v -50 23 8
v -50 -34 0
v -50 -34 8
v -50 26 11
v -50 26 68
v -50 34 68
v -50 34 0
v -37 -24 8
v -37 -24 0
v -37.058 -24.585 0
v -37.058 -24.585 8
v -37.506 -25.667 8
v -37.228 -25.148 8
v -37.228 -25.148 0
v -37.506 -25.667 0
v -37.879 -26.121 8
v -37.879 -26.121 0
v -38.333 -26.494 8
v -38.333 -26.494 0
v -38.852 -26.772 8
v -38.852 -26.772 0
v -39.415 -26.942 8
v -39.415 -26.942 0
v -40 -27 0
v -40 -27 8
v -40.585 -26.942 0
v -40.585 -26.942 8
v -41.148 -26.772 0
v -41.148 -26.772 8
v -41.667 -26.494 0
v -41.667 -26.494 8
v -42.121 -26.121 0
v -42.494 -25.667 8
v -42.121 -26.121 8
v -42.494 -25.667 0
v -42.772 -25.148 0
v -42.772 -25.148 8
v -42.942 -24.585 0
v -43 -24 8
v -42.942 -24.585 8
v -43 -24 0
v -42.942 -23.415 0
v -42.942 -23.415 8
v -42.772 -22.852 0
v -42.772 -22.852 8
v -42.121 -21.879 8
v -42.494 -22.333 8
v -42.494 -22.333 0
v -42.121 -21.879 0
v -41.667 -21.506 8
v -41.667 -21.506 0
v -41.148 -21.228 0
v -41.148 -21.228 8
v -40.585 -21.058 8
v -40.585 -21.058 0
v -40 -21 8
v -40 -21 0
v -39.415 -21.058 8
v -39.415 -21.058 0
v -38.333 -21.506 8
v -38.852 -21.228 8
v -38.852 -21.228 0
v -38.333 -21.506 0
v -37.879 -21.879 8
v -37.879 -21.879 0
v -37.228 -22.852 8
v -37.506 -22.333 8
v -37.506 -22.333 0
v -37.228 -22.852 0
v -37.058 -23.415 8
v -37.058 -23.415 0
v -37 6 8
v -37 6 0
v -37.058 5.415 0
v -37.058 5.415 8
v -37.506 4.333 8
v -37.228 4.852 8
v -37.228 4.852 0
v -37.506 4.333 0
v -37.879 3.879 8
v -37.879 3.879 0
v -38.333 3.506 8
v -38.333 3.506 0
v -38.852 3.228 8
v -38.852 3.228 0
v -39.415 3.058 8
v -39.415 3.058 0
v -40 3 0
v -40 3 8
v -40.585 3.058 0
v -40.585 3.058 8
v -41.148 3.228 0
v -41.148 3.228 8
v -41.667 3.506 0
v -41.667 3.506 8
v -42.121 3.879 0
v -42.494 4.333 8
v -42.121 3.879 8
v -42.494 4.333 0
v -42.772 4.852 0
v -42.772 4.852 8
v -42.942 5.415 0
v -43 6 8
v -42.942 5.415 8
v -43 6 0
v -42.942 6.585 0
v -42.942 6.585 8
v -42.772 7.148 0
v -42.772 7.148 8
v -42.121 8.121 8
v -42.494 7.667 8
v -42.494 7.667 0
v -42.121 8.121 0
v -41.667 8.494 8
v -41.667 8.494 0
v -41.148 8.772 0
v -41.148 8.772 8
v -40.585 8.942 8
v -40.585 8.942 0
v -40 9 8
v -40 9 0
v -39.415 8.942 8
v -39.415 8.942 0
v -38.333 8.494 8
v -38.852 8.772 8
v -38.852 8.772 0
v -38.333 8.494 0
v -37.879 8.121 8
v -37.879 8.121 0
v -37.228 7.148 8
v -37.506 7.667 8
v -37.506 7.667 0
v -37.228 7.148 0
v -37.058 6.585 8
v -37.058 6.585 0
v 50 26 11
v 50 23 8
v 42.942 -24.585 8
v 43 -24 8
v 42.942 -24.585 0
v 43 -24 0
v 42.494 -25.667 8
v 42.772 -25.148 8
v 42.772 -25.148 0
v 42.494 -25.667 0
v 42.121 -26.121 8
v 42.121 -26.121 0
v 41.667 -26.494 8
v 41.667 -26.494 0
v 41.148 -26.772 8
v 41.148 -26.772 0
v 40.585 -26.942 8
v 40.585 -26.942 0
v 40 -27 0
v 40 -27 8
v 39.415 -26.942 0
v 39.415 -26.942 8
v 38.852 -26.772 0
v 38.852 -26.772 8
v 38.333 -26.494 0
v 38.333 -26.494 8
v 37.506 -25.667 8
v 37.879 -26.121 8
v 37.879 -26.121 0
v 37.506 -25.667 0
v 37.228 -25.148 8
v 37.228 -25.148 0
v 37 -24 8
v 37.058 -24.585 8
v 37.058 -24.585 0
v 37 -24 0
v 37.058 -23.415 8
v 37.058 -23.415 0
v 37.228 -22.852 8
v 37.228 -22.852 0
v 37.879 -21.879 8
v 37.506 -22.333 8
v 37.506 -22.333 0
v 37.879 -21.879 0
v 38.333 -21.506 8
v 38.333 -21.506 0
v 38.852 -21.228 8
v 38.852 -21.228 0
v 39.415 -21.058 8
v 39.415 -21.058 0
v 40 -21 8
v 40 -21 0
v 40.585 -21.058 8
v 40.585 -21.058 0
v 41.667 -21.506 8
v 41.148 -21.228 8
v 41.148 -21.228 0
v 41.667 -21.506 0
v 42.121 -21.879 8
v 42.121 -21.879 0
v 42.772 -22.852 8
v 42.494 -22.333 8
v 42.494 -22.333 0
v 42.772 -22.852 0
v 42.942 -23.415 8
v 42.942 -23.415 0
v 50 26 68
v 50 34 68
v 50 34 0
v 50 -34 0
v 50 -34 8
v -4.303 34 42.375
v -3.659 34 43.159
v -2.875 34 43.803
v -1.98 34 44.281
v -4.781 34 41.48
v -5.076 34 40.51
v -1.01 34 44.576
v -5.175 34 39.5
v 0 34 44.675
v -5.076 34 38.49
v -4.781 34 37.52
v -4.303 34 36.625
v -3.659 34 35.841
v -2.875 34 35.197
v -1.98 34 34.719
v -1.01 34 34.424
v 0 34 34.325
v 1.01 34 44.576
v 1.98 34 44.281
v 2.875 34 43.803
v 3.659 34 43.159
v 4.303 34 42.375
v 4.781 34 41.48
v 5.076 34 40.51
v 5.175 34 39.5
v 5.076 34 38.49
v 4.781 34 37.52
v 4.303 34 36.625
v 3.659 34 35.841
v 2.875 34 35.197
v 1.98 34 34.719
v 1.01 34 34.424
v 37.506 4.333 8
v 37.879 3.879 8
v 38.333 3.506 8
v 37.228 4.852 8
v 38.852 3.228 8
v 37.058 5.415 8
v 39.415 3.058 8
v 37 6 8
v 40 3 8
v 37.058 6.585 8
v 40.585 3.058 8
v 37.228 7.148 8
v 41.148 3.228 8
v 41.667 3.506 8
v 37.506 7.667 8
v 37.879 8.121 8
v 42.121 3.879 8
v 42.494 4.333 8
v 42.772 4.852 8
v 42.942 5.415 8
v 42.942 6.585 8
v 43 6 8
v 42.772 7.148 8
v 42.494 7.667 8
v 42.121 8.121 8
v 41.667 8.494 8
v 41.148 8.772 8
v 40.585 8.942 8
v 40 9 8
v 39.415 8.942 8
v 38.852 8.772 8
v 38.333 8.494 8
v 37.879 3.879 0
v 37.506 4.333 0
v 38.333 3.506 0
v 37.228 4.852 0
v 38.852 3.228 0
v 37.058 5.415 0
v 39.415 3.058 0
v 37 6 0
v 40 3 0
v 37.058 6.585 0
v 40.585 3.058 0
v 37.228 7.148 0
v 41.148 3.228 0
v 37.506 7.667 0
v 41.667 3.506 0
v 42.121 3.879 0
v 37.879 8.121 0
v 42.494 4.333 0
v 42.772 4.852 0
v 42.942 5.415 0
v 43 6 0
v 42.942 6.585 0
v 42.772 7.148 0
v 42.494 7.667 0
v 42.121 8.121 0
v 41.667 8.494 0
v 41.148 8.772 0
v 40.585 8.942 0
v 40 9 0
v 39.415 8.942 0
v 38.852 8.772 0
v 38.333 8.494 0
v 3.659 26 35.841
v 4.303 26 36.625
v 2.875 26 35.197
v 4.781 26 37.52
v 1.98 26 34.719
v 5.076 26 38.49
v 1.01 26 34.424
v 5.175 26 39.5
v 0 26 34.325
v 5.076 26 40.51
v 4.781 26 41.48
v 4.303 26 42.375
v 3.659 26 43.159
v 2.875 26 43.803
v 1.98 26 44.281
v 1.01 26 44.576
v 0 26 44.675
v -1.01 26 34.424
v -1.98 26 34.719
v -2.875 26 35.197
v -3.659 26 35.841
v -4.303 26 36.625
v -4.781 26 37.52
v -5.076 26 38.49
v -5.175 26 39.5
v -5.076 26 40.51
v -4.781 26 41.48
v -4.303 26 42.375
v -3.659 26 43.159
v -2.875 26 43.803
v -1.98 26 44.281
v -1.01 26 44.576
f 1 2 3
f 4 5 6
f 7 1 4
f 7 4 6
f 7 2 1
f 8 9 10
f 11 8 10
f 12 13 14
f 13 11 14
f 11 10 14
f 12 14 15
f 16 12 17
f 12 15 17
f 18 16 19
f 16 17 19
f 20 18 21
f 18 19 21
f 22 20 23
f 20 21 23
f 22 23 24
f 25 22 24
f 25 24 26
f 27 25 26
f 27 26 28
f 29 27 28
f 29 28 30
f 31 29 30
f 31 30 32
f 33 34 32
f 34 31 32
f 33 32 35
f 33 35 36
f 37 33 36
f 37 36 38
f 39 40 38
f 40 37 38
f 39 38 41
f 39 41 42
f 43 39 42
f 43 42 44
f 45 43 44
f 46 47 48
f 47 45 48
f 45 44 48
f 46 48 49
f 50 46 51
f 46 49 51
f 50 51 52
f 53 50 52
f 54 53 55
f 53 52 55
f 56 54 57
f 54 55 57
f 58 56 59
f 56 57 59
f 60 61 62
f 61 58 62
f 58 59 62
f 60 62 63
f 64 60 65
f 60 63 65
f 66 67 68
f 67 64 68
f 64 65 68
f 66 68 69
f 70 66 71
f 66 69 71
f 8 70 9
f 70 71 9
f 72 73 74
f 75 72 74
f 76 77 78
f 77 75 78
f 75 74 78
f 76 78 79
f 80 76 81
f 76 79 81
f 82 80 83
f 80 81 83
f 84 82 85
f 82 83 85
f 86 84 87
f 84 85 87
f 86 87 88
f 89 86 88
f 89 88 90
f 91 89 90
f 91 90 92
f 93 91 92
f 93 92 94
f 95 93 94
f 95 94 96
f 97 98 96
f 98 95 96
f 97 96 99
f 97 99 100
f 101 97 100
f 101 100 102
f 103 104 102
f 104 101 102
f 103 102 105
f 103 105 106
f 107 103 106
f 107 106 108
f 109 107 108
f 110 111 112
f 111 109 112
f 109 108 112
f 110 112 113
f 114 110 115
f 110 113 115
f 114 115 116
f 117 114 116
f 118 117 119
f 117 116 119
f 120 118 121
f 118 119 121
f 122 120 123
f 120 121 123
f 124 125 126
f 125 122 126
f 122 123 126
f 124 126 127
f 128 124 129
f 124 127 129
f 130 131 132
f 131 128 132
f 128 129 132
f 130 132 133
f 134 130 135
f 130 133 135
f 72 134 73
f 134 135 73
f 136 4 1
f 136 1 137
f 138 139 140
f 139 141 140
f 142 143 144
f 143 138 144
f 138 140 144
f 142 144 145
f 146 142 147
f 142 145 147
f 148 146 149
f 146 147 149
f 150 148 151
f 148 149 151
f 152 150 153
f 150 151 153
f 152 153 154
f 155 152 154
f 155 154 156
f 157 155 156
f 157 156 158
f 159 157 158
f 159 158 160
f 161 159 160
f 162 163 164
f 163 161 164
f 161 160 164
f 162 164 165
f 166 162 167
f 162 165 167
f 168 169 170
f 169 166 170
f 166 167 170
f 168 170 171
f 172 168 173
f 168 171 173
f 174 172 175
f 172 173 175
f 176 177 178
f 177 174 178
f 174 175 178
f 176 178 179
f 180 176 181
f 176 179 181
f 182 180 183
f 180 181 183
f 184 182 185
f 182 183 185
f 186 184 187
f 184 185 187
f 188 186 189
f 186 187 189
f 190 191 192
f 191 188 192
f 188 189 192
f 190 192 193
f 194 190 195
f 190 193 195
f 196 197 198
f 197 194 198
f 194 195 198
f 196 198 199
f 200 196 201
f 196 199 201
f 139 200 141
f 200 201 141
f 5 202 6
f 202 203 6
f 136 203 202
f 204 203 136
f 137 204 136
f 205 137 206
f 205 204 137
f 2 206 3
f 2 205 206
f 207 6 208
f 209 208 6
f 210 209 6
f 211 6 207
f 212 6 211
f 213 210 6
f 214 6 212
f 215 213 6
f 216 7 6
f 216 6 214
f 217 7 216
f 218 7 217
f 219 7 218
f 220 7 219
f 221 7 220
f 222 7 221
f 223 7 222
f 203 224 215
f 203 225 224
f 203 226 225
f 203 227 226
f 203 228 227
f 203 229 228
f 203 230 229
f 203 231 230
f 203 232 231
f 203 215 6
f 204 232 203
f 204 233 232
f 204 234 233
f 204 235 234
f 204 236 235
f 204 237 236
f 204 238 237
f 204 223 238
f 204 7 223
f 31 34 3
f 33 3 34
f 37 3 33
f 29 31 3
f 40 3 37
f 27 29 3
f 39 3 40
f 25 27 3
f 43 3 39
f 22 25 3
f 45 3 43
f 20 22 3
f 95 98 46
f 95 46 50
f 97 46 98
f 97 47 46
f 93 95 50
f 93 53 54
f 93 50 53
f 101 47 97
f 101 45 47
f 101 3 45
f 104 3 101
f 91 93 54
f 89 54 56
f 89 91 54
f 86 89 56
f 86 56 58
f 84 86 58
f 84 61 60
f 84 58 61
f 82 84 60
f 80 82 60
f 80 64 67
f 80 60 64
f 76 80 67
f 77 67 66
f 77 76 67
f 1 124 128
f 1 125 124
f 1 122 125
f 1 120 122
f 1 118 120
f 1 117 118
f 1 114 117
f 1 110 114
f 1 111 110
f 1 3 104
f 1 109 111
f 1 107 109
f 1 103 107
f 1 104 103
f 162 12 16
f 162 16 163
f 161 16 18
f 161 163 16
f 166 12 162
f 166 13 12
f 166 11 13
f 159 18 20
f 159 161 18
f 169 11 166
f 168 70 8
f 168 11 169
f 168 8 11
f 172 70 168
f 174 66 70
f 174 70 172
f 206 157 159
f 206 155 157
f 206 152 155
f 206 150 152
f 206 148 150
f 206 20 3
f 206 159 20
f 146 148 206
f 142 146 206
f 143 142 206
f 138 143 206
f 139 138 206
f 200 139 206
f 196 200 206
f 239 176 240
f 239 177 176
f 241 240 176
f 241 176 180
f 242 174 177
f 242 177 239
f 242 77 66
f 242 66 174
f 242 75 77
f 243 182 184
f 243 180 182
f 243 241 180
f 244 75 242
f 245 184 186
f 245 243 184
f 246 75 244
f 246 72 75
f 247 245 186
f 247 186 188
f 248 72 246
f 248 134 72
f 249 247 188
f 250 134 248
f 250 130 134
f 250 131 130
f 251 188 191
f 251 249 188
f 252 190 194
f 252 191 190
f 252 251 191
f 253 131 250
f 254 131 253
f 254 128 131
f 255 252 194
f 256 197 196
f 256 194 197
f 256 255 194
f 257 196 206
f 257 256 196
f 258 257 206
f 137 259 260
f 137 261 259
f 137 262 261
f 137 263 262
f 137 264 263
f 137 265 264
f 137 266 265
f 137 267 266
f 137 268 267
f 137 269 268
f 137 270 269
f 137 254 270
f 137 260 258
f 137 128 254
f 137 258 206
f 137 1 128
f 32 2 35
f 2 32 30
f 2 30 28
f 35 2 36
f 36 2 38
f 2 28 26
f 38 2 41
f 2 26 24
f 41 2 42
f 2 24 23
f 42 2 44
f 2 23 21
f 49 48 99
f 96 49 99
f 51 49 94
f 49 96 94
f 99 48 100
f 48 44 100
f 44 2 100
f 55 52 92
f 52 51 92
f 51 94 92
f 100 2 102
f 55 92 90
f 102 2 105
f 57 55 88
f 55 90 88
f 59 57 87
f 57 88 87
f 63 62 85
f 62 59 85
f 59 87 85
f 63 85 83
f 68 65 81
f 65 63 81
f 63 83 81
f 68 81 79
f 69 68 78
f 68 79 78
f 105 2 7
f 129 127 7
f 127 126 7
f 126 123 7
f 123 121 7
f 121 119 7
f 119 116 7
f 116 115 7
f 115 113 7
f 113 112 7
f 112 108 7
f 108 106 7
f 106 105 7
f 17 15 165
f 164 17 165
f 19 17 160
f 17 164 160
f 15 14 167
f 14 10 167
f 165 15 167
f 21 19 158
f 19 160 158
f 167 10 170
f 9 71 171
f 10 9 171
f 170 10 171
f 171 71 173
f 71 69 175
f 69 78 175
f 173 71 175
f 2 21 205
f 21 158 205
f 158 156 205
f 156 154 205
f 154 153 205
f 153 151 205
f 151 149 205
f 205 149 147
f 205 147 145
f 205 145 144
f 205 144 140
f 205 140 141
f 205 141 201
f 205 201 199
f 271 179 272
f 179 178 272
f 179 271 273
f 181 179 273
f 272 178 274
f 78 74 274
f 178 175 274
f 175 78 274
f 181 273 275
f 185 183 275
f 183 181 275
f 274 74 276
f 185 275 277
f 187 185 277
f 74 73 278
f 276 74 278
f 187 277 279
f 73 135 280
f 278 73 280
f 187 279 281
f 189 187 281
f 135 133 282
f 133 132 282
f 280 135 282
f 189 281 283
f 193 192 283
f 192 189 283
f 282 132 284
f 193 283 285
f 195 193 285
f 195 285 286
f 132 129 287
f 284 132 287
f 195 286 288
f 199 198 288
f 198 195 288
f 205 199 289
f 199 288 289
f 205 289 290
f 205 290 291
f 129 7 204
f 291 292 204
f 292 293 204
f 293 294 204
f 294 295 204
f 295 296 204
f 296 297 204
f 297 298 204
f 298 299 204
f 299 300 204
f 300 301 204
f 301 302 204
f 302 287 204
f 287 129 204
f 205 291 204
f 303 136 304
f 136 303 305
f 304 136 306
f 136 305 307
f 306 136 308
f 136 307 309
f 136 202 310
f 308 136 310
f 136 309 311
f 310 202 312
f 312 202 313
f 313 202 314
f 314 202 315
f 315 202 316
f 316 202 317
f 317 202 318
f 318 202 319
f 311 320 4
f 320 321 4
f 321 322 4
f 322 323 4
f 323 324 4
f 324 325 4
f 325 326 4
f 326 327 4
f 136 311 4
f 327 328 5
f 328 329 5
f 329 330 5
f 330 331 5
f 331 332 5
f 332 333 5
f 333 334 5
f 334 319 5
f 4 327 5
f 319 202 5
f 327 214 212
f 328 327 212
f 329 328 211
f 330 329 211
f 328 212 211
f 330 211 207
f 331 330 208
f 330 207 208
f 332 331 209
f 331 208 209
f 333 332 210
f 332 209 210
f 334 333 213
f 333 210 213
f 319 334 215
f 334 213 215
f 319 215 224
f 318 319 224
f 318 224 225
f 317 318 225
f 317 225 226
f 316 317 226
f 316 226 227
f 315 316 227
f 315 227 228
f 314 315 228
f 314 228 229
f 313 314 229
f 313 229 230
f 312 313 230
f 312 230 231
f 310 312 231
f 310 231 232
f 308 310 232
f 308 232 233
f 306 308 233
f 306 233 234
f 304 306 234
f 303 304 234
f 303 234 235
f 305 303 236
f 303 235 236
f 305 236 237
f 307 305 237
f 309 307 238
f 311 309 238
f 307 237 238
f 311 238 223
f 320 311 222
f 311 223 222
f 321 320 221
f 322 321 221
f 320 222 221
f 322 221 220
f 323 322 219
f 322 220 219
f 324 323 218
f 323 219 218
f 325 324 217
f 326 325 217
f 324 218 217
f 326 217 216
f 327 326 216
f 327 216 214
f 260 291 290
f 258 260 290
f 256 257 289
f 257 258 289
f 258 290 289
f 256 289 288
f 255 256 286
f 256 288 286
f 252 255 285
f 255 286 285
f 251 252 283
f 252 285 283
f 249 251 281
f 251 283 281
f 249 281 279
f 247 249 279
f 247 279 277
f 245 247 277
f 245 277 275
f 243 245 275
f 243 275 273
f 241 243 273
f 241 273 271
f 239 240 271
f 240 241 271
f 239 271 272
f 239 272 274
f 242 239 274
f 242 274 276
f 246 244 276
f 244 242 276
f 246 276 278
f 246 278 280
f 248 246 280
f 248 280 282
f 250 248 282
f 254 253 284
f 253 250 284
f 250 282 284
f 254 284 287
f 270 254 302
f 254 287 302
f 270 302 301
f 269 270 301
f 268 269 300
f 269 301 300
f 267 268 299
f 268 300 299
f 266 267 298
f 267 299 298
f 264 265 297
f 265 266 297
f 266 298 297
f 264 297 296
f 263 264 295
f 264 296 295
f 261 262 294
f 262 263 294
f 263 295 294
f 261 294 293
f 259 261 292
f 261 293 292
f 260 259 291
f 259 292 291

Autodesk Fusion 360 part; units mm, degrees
sketch "Boceto1" plane through (0, 0, 0) normal (0, 0, 1) x (1, 0, 0)
  line L0 (50, -34) -> (-50, -34)
  line L1 (-50, -34) -> (-50, 34)
  line L2 (-50, 34) -> (50, 34)
  line L3 (50, 34) -> (50, -34)
  line L4 (50, -34) -> (-50, 34) construction
  line L5 (-50, -34) -> (50, 34) construction
  circle A0 centre (-40, 6) radius 3
  circle A1 centre (-40, -24) radius 3
  line L6 (0, -34) -> (0, 34) construction
  circle A2 centre (40, 6) radius 3
  circle A3 centre (40, -24) radius 3
  dimension "d1" = 100
  dimension "d2" = 68
  dimension "d3" = 6
  dimension "d4" = 6
  dimension "d5" = 30
  dimension "d6" = 10
  dimension "d7" = 10
  dimension "d8" = 10
extrude "Extruir1" add sketch "Boceto1" along normal blind 8
sketch "Boceto2" plane through (0, 34, 0) normal (0, 1, 0) x (-1, 0, 0)
  line L0 (-50, 0) -> (50, 0)
  line L1 (50, 0) -> (50, 8)
  line L2 (50, 8) -> (-50, 8)
  line L3 (-50, 8) -> (-50, 0)
  line L4 (-50, 0) -> (-50, 68)
  line L5 (-50, 68) -> (50, 68)
  line L6 (50, 68) -> (50, 0)
  circle A0 centre (0, 39.5) radius 5.175
  dimension "d16" = 68
  dimension "d17" = 10.35
  dimension "d18" = 50
  dimension "d19" = 28.5
extrude "Extruir2" add sketch "Boceto2" against normal blind 8 contours L2 L4 L5 L6
chamfer "Chaflán1" distance 3 angle 45 1 edges at (0, 26, 8)
